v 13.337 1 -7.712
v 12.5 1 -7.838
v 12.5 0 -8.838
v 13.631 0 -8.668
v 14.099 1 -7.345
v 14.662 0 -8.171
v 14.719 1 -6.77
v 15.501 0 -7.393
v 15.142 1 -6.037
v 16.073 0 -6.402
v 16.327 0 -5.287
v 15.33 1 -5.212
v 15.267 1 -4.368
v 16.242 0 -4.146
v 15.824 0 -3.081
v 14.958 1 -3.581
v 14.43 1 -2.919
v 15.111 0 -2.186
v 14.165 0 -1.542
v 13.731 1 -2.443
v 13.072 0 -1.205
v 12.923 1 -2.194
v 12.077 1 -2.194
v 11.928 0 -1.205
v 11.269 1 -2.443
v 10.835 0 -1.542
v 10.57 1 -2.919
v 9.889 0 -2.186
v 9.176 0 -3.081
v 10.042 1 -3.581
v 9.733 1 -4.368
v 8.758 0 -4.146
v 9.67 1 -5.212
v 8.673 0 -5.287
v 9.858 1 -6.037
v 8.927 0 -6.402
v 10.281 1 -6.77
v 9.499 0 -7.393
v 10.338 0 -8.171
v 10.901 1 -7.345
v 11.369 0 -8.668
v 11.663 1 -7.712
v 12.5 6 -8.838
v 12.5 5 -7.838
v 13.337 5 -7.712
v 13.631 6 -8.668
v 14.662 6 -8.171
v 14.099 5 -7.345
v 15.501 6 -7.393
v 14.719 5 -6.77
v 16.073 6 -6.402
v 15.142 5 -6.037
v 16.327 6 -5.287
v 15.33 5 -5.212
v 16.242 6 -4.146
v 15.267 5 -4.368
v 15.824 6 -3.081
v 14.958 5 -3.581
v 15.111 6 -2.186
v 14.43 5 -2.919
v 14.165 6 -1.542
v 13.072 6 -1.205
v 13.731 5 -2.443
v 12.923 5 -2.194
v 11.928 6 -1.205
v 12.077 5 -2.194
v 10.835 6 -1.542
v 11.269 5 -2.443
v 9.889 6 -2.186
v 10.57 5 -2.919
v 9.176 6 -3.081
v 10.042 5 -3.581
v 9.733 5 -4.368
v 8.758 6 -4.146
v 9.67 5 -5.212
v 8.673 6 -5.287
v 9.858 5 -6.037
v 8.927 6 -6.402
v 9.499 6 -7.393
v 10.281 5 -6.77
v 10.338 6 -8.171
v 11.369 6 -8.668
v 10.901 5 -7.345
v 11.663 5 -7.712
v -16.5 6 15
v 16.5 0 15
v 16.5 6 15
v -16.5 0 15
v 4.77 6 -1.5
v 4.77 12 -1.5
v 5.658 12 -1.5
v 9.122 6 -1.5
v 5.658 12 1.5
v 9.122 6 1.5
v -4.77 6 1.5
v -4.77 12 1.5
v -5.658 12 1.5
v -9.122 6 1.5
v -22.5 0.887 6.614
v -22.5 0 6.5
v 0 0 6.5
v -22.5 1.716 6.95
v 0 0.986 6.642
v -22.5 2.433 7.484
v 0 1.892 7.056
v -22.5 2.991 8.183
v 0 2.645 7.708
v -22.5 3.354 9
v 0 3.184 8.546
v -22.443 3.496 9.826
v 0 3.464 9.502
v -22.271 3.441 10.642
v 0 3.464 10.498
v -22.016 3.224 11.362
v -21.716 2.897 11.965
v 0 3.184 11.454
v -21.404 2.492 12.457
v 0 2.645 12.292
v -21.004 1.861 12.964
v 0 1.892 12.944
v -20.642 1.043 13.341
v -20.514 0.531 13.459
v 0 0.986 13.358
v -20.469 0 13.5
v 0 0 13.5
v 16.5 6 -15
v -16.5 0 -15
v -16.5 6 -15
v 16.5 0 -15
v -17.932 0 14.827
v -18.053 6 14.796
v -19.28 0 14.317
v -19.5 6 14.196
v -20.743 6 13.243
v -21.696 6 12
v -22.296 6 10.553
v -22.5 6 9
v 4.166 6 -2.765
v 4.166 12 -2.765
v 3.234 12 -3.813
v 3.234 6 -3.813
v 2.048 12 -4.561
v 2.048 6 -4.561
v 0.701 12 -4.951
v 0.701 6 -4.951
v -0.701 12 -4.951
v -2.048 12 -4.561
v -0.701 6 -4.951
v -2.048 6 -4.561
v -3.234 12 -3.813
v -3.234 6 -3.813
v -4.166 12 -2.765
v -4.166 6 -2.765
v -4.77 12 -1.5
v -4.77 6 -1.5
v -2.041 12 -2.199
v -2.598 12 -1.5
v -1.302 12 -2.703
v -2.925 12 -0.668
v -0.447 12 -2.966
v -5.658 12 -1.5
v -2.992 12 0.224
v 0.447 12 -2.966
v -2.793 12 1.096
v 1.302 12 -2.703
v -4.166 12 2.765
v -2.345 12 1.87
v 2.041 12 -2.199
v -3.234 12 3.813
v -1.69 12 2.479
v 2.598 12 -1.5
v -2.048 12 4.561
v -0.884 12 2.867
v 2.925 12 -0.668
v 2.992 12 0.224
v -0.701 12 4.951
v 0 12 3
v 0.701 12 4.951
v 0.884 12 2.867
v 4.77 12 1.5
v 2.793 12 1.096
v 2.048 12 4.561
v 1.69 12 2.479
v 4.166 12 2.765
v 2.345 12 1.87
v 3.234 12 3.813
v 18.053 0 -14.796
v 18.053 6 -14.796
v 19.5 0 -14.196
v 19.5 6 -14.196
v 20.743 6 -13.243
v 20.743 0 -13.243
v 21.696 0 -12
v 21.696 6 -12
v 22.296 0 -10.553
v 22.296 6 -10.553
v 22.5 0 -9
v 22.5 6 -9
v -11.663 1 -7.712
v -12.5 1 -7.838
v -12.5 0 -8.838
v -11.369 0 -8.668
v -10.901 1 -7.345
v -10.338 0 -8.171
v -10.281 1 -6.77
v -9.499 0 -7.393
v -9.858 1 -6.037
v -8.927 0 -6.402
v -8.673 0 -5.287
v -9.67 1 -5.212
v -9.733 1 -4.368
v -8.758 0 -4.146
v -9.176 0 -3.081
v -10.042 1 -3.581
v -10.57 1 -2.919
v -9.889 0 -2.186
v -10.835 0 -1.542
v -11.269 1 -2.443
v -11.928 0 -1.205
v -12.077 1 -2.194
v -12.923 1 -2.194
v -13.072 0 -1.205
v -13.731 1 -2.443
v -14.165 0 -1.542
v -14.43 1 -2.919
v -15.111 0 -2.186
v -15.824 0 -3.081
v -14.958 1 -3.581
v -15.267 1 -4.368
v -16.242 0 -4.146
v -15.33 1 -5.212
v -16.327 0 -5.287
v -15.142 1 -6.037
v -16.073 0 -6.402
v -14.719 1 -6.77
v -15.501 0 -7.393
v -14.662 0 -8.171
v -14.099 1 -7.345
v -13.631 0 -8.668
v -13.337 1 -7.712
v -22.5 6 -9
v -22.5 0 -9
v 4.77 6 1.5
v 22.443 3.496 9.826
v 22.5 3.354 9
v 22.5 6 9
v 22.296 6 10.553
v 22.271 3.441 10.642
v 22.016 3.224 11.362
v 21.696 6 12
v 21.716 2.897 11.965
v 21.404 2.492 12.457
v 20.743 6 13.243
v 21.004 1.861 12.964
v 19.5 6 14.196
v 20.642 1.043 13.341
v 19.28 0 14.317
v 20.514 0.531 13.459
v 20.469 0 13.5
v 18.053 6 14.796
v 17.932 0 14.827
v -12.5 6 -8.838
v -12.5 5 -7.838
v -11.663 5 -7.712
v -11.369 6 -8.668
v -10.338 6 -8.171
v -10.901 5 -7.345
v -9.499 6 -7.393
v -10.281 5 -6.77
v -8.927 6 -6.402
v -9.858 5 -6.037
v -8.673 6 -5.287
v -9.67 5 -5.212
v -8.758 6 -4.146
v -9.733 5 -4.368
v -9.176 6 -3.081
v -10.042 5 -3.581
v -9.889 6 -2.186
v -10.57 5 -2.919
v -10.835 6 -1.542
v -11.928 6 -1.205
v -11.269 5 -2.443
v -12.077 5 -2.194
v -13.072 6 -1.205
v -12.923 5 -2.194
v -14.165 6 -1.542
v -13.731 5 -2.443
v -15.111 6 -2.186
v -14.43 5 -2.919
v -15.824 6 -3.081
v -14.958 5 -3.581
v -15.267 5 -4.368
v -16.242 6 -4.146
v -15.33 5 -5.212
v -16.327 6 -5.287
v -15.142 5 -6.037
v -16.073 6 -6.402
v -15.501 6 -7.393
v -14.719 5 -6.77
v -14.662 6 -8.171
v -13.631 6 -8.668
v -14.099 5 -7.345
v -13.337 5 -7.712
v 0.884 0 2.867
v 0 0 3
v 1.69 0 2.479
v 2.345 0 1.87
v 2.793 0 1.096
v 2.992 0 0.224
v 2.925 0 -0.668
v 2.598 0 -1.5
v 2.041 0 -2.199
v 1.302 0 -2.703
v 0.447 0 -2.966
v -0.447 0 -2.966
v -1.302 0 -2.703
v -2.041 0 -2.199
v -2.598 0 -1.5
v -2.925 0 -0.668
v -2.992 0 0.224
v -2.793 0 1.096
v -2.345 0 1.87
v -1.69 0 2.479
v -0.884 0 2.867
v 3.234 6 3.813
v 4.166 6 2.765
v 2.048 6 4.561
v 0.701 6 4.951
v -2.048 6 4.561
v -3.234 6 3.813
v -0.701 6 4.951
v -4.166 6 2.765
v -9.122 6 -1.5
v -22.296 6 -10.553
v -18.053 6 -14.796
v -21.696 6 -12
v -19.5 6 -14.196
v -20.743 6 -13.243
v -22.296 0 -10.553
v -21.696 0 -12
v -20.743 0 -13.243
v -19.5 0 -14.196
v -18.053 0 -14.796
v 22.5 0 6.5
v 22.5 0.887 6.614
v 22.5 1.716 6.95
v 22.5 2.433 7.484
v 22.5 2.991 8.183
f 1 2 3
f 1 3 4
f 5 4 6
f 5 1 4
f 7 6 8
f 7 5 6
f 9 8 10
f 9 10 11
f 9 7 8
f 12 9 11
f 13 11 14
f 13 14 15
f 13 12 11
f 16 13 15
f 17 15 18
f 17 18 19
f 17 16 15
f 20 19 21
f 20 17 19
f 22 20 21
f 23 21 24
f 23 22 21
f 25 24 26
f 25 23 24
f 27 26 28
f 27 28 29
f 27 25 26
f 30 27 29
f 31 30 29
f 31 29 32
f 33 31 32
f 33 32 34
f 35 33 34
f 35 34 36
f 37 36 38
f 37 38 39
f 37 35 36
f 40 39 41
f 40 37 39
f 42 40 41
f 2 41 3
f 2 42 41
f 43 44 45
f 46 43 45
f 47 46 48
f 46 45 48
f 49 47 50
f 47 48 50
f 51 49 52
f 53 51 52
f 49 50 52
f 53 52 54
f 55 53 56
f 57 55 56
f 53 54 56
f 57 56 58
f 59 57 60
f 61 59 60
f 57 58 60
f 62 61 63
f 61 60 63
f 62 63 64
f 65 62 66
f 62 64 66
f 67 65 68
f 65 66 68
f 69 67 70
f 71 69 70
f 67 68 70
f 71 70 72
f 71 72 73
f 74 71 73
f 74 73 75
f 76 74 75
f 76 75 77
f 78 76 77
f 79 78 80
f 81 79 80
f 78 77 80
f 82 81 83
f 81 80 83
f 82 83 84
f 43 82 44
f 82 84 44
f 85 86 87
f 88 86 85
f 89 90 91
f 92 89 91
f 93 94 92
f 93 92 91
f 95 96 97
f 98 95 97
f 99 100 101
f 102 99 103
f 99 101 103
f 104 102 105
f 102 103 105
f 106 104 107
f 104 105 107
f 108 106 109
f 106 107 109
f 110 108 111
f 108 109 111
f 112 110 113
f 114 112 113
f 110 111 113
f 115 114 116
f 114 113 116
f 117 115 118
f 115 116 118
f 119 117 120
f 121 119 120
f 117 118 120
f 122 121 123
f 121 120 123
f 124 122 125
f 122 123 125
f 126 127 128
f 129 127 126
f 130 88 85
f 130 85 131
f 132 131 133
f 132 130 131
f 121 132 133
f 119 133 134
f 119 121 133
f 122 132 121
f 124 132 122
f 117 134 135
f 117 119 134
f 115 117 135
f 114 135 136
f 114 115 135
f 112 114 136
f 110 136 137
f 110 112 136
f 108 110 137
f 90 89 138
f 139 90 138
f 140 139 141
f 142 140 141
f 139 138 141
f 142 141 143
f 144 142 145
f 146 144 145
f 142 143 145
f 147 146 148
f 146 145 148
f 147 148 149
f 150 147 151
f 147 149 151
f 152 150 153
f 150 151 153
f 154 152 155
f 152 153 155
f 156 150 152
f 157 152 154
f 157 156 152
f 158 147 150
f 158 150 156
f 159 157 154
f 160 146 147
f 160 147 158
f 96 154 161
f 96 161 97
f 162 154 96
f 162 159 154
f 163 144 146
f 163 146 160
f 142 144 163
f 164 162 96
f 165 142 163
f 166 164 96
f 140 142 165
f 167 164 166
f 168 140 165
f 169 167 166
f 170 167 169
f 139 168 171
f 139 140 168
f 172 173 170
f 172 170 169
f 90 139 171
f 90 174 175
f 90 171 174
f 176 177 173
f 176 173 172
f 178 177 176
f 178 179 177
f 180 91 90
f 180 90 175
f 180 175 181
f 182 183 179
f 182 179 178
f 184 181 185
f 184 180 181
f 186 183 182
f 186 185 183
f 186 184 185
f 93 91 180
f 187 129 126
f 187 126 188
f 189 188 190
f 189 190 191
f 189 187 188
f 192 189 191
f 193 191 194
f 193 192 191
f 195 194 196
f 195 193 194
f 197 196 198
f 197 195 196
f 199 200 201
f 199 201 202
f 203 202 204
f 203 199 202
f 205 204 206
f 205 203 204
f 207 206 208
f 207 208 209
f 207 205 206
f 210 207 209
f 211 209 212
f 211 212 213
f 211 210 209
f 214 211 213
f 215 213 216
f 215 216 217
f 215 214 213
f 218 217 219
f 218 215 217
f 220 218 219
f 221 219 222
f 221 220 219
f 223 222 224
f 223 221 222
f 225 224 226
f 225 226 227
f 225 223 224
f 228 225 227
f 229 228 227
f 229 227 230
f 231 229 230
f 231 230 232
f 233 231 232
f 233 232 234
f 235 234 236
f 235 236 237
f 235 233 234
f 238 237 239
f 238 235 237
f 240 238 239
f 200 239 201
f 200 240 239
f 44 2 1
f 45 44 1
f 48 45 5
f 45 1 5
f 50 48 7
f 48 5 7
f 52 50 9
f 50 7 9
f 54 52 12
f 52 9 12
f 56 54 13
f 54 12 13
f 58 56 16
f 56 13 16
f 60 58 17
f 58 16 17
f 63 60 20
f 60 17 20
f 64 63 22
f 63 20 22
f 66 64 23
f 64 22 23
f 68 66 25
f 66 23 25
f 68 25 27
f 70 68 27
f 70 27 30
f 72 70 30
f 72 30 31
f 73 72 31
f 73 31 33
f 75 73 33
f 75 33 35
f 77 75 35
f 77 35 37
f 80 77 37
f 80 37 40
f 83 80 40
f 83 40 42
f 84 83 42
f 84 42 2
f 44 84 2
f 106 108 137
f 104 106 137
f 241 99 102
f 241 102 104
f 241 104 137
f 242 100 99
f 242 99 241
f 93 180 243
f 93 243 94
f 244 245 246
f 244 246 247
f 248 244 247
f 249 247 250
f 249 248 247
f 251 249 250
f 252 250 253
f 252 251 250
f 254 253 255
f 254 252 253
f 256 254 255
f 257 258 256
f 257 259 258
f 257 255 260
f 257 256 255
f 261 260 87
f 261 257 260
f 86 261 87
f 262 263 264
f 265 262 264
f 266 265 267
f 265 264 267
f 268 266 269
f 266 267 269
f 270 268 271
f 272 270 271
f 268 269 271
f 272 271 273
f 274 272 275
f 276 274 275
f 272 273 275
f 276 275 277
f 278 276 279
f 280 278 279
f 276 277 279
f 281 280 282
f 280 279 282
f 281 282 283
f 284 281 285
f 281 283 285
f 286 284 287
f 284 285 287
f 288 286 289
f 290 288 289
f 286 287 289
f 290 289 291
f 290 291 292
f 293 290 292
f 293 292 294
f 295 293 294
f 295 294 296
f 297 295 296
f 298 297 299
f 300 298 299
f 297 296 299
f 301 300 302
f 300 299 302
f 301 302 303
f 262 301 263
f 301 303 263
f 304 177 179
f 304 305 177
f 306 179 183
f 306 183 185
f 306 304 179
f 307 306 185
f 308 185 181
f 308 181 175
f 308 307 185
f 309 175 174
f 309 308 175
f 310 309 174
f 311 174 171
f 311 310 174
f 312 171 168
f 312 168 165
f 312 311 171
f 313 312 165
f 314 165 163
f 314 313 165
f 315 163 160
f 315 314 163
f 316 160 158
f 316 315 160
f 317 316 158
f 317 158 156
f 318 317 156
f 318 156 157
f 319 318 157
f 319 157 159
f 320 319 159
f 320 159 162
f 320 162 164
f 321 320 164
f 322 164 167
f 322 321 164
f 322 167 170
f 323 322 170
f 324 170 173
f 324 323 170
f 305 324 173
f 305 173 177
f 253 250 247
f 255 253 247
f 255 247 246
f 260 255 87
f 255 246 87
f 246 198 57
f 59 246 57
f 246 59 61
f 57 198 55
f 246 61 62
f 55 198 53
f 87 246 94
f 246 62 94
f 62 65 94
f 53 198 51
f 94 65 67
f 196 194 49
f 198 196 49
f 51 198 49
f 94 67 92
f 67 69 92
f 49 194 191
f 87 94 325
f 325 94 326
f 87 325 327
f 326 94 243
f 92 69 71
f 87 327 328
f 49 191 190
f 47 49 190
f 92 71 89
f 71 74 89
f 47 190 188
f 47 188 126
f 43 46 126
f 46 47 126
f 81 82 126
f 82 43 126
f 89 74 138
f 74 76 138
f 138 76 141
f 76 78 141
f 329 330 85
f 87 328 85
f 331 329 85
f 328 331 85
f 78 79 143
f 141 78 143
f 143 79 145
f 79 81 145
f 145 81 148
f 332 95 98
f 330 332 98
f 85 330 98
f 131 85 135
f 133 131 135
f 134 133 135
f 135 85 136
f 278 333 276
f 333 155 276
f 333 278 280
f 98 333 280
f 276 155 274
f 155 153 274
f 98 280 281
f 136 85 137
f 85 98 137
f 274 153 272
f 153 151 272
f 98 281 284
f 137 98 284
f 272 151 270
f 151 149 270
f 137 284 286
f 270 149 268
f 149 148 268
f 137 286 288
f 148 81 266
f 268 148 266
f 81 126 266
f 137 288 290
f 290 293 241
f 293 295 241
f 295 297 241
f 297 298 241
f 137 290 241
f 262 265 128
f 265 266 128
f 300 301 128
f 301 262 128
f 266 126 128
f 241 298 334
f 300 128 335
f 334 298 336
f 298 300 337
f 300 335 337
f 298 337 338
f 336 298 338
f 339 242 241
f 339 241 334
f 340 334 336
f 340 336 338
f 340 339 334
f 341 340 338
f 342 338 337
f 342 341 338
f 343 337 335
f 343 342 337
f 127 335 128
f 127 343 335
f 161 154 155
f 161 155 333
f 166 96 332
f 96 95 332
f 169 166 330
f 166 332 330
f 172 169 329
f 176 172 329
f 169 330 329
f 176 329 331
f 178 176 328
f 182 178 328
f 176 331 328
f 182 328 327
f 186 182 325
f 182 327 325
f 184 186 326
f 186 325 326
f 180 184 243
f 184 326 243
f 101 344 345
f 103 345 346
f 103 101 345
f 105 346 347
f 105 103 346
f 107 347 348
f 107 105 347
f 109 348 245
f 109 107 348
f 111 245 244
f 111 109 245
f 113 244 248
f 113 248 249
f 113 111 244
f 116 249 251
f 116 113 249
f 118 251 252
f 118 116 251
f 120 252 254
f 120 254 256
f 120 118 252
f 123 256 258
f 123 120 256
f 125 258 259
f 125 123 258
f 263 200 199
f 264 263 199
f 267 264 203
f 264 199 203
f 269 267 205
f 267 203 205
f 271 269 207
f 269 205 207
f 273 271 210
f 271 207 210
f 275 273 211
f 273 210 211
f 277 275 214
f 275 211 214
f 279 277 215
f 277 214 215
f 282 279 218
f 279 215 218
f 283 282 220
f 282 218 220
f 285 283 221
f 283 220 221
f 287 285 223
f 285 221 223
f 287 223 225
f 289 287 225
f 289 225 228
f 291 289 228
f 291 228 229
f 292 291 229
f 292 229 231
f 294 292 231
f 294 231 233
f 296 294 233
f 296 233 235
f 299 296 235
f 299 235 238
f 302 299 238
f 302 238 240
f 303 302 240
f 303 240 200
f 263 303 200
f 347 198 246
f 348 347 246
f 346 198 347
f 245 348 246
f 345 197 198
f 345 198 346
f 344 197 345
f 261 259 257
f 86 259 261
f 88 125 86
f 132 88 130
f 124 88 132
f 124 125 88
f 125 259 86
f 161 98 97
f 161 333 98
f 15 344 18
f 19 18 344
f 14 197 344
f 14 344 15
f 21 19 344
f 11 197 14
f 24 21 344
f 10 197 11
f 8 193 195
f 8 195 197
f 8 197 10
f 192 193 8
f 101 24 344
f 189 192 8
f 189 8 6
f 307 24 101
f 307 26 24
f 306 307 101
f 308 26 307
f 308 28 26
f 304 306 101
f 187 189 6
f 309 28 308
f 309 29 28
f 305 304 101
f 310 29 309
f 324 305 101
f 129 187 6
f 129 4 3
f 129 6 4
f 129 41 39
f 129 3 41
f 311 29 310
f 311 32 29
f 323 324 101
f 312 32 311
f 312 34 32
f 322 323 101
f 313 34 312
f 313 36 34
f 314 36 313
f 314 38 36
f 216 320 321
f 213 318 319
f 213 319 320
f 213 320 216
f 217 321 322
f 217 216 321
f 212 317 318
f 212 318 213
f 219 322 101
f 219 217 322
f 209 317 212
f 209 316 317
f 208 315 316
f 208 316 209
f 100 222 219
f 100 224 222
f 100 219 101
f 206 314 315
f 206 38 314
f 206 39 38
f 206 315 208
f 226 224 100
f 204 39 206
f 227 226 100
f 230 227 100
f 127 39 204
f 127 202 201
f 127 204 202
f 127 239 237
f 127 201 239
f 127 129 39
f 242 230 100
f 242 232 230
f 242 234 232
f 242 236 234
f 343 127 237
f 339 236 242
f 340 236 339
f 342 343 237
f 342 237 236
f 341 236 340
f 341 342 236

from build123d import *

# Parameters (mm, degrees)
IZIM1_R                           = 3
Y_KSEKLIK_EKSTR_ZYON1_DEPTH       = 6
IZIM2_R                           = 5
IZIM2_R_2                         = 3
Y_KSEKLIK_EKSTR_ZYON2_DEPTH       = 6
Y_KSEKLIK_EKSTR_ZYON3_DEPTH       = 1.5
KES_EKSTR_ZYON1_REACH             = 31.585
IZIM5_R                           = 3.5
KES_EKSTR_ZYON1_DIRECTION_2_REACH = 31.585
IZIM6_R                           = 2.838174874
KES_EKSTR_ZYON2_DEPTH             = 44
PAH1_SIZE                         = 1


with BuildPart() as part:
    # Çizim1 → Yükseklik-Ekstrüzyon1 (new body)
    with BuildSketch(Plane(origin=(0, 0, 0), x_dir=(1, 0, 0), z_dir=(0, 1, 0))):
        with BuildLine():
            Line((-16.5, 15), (16.5, 15))
            ThreePointArc((16.5, 15), (20.742640687, 13.242640687), (22.5, 9))
            Line((22.5, 9), (22.5, -9))
            ThreePointArc((22.5, -9), (20.742640687, -13.242640687), (16.5, -15))
            Line((16.5, -15), (-16.5, -15))
            ThreePointArc((-16.5, -15), (-20.742640687, -13.242640687), (-22.5, -9))
            Line((-22.5, -9), (-22.5, 9))
            ThreePointArc((-22.5, 9), (-20.742640687, 13.242640687), (-16.5, 15))
        make_face()
        with Locations(Location((0, 0, 0), (0, 0, 270))):
            Circle(IZIM1_R, mode=Mode.SUBTRACT)
    extrude(amount=Y_KSEKLIK_EKSTR_ZYON1_DEPTH)

    # Çizim2 → Yükseklik-Ekstrüzyon2 (add)
    with BuildSketch(Plane(origin=(0, 6, 0), x_dir=(1, 0, 0), z_dir=(0, 1, 0))):
        with Locations(Location((0, 0, 0), (0, 0, 270))):
            Circle(IZIM2_R)
        with Locations(Location((0, 0, 0), (0, 0, 270))):
            Circle(IZIM2_R_2, mode=Mode.SUBTRACT)
    extrude(amount=Y_KSEKLIK_EKSTR_ZYON2_DEPTH)

    # Çizim4 → Yükseklik-Ekstrüzyon3 (add, symmetric)
    with BuildSketch(Plane.XY):
        Polygon((-5.65775064, 12), (-3.798545346, 12), (-3.798545346, 6), (-9.121852255, 6), align=None)
        Polygon((3.798545346, 12), (3.798545346, 6), (9.121852255, 6), (5.65775064, 12), align=None)
    extrude(amount=Y_KSEKLIK_EKSTR_ZYON3_DEPTH, both=True)

    # Kes-Ekstrüzyon1: up to this face of the body (flat: up to its plane)
    kes_ekstr_zyon1_end = Plane(part.part.faces().sort_by_distance((-22.5, 3, 0))[0])
    # Çizim5 → Kes-Ekstrüzyon1 (cut, up to the picked face)
    with BuildSketch(Plane(origin=(0, 0, 0), x_dir=(0, 0, -1), z_dir=(1, 0, 0)), mode=Mode.PRIVATE) as kes_ekstr_zyon1_sk1:
        with Locations((-10, 0)):
            Circle(IZIM5_R)
    kes_ekstr_zyon1_tool1 = split(extrude(kes_ekstr_zyon1_sk1.sketch, amount=-KES_EKSTR_ZYON1_REACH, mode=Mode.PRIVATE), bisect_by=kes_ekstr_zyon1_end, keep=Keep.BOTH, mode=Mode.PRIVATE)
    add(kes_ekstr_zyon1_tool1.solids().sort_by(Axis((0, 0, 10), (-1, 0, 0)))[0], mode=Mode.SUBTRACT)

    # Kes-Ekstrüzyon1 direction 2: up to this face of the body (flat: up to its plane)
    kes_ekstr_zyon1_direction_2_end = Plane(part.part.faces().sort_by_distance((22.5, 3, 0))[0])
    # Çizim5 → Kes-Ekstrüzyon1 direction 2 (cut, up to the picked face)
    with BuildSketch(Plane(origin=(0, 0, 0), x_dir=(0, 0, -1), z_dir=(1, 0, 0)), mode=Mode.PRIVATE) as kes_ekstr_zyon1_direction_2_sk1:
        with Locations((-10, 0)):
            Circle(IZIM5_R)
    kes_ekstr_zyon1_direction_2_tool1 = split(extrude(kes_ekstr_zyon1_direction_2_sk1.sketch, amount=KES_EKSTR_ZYON1_DIRECTION_2_REACH, mode=Mode.PRIVATE), bisect_by=kes_ekstr_zyon1_direction_2_end, keep=Keep.BOTH, mode=Mode.PRIVATE)
    add(kes_ekstr_zyon1_direction_2_tool1.solids().sort_by(Axis((0, 0, 10), (1, 0, 0)))[0], mode=Mode.SUBTRACT)

    # Çizim6 → Kes-Ekstrüzyon2 (cut)
    with BuildSketch(Plane.XZ):
        with Locations(Location((-12.5, -5, 0), (0, 0, 270))):
            Circle(IZIM6_R)
        with Locations(Location((12.5, -5, 0), (0, 0, 270))):
            Circle(IZIM6_R)
    extrude(amount=-KES_EKSTR_ZYON2_DEPTH, mode=Mode.SUBTRACT)

    # Pah1
    pah1_edges = [part.edges().sort_by_distance(p)[0] for p in [
        (-12.5, 6, -2.161825126),
        (-12.5, 0, -2.161825126),
        (12.5, 6, -2.161825126),
        (12.5, 0, -2.161825126),
    ]]
    chamfer(pah1_edges, length=PAH1_SIZE)


solid = part.part
